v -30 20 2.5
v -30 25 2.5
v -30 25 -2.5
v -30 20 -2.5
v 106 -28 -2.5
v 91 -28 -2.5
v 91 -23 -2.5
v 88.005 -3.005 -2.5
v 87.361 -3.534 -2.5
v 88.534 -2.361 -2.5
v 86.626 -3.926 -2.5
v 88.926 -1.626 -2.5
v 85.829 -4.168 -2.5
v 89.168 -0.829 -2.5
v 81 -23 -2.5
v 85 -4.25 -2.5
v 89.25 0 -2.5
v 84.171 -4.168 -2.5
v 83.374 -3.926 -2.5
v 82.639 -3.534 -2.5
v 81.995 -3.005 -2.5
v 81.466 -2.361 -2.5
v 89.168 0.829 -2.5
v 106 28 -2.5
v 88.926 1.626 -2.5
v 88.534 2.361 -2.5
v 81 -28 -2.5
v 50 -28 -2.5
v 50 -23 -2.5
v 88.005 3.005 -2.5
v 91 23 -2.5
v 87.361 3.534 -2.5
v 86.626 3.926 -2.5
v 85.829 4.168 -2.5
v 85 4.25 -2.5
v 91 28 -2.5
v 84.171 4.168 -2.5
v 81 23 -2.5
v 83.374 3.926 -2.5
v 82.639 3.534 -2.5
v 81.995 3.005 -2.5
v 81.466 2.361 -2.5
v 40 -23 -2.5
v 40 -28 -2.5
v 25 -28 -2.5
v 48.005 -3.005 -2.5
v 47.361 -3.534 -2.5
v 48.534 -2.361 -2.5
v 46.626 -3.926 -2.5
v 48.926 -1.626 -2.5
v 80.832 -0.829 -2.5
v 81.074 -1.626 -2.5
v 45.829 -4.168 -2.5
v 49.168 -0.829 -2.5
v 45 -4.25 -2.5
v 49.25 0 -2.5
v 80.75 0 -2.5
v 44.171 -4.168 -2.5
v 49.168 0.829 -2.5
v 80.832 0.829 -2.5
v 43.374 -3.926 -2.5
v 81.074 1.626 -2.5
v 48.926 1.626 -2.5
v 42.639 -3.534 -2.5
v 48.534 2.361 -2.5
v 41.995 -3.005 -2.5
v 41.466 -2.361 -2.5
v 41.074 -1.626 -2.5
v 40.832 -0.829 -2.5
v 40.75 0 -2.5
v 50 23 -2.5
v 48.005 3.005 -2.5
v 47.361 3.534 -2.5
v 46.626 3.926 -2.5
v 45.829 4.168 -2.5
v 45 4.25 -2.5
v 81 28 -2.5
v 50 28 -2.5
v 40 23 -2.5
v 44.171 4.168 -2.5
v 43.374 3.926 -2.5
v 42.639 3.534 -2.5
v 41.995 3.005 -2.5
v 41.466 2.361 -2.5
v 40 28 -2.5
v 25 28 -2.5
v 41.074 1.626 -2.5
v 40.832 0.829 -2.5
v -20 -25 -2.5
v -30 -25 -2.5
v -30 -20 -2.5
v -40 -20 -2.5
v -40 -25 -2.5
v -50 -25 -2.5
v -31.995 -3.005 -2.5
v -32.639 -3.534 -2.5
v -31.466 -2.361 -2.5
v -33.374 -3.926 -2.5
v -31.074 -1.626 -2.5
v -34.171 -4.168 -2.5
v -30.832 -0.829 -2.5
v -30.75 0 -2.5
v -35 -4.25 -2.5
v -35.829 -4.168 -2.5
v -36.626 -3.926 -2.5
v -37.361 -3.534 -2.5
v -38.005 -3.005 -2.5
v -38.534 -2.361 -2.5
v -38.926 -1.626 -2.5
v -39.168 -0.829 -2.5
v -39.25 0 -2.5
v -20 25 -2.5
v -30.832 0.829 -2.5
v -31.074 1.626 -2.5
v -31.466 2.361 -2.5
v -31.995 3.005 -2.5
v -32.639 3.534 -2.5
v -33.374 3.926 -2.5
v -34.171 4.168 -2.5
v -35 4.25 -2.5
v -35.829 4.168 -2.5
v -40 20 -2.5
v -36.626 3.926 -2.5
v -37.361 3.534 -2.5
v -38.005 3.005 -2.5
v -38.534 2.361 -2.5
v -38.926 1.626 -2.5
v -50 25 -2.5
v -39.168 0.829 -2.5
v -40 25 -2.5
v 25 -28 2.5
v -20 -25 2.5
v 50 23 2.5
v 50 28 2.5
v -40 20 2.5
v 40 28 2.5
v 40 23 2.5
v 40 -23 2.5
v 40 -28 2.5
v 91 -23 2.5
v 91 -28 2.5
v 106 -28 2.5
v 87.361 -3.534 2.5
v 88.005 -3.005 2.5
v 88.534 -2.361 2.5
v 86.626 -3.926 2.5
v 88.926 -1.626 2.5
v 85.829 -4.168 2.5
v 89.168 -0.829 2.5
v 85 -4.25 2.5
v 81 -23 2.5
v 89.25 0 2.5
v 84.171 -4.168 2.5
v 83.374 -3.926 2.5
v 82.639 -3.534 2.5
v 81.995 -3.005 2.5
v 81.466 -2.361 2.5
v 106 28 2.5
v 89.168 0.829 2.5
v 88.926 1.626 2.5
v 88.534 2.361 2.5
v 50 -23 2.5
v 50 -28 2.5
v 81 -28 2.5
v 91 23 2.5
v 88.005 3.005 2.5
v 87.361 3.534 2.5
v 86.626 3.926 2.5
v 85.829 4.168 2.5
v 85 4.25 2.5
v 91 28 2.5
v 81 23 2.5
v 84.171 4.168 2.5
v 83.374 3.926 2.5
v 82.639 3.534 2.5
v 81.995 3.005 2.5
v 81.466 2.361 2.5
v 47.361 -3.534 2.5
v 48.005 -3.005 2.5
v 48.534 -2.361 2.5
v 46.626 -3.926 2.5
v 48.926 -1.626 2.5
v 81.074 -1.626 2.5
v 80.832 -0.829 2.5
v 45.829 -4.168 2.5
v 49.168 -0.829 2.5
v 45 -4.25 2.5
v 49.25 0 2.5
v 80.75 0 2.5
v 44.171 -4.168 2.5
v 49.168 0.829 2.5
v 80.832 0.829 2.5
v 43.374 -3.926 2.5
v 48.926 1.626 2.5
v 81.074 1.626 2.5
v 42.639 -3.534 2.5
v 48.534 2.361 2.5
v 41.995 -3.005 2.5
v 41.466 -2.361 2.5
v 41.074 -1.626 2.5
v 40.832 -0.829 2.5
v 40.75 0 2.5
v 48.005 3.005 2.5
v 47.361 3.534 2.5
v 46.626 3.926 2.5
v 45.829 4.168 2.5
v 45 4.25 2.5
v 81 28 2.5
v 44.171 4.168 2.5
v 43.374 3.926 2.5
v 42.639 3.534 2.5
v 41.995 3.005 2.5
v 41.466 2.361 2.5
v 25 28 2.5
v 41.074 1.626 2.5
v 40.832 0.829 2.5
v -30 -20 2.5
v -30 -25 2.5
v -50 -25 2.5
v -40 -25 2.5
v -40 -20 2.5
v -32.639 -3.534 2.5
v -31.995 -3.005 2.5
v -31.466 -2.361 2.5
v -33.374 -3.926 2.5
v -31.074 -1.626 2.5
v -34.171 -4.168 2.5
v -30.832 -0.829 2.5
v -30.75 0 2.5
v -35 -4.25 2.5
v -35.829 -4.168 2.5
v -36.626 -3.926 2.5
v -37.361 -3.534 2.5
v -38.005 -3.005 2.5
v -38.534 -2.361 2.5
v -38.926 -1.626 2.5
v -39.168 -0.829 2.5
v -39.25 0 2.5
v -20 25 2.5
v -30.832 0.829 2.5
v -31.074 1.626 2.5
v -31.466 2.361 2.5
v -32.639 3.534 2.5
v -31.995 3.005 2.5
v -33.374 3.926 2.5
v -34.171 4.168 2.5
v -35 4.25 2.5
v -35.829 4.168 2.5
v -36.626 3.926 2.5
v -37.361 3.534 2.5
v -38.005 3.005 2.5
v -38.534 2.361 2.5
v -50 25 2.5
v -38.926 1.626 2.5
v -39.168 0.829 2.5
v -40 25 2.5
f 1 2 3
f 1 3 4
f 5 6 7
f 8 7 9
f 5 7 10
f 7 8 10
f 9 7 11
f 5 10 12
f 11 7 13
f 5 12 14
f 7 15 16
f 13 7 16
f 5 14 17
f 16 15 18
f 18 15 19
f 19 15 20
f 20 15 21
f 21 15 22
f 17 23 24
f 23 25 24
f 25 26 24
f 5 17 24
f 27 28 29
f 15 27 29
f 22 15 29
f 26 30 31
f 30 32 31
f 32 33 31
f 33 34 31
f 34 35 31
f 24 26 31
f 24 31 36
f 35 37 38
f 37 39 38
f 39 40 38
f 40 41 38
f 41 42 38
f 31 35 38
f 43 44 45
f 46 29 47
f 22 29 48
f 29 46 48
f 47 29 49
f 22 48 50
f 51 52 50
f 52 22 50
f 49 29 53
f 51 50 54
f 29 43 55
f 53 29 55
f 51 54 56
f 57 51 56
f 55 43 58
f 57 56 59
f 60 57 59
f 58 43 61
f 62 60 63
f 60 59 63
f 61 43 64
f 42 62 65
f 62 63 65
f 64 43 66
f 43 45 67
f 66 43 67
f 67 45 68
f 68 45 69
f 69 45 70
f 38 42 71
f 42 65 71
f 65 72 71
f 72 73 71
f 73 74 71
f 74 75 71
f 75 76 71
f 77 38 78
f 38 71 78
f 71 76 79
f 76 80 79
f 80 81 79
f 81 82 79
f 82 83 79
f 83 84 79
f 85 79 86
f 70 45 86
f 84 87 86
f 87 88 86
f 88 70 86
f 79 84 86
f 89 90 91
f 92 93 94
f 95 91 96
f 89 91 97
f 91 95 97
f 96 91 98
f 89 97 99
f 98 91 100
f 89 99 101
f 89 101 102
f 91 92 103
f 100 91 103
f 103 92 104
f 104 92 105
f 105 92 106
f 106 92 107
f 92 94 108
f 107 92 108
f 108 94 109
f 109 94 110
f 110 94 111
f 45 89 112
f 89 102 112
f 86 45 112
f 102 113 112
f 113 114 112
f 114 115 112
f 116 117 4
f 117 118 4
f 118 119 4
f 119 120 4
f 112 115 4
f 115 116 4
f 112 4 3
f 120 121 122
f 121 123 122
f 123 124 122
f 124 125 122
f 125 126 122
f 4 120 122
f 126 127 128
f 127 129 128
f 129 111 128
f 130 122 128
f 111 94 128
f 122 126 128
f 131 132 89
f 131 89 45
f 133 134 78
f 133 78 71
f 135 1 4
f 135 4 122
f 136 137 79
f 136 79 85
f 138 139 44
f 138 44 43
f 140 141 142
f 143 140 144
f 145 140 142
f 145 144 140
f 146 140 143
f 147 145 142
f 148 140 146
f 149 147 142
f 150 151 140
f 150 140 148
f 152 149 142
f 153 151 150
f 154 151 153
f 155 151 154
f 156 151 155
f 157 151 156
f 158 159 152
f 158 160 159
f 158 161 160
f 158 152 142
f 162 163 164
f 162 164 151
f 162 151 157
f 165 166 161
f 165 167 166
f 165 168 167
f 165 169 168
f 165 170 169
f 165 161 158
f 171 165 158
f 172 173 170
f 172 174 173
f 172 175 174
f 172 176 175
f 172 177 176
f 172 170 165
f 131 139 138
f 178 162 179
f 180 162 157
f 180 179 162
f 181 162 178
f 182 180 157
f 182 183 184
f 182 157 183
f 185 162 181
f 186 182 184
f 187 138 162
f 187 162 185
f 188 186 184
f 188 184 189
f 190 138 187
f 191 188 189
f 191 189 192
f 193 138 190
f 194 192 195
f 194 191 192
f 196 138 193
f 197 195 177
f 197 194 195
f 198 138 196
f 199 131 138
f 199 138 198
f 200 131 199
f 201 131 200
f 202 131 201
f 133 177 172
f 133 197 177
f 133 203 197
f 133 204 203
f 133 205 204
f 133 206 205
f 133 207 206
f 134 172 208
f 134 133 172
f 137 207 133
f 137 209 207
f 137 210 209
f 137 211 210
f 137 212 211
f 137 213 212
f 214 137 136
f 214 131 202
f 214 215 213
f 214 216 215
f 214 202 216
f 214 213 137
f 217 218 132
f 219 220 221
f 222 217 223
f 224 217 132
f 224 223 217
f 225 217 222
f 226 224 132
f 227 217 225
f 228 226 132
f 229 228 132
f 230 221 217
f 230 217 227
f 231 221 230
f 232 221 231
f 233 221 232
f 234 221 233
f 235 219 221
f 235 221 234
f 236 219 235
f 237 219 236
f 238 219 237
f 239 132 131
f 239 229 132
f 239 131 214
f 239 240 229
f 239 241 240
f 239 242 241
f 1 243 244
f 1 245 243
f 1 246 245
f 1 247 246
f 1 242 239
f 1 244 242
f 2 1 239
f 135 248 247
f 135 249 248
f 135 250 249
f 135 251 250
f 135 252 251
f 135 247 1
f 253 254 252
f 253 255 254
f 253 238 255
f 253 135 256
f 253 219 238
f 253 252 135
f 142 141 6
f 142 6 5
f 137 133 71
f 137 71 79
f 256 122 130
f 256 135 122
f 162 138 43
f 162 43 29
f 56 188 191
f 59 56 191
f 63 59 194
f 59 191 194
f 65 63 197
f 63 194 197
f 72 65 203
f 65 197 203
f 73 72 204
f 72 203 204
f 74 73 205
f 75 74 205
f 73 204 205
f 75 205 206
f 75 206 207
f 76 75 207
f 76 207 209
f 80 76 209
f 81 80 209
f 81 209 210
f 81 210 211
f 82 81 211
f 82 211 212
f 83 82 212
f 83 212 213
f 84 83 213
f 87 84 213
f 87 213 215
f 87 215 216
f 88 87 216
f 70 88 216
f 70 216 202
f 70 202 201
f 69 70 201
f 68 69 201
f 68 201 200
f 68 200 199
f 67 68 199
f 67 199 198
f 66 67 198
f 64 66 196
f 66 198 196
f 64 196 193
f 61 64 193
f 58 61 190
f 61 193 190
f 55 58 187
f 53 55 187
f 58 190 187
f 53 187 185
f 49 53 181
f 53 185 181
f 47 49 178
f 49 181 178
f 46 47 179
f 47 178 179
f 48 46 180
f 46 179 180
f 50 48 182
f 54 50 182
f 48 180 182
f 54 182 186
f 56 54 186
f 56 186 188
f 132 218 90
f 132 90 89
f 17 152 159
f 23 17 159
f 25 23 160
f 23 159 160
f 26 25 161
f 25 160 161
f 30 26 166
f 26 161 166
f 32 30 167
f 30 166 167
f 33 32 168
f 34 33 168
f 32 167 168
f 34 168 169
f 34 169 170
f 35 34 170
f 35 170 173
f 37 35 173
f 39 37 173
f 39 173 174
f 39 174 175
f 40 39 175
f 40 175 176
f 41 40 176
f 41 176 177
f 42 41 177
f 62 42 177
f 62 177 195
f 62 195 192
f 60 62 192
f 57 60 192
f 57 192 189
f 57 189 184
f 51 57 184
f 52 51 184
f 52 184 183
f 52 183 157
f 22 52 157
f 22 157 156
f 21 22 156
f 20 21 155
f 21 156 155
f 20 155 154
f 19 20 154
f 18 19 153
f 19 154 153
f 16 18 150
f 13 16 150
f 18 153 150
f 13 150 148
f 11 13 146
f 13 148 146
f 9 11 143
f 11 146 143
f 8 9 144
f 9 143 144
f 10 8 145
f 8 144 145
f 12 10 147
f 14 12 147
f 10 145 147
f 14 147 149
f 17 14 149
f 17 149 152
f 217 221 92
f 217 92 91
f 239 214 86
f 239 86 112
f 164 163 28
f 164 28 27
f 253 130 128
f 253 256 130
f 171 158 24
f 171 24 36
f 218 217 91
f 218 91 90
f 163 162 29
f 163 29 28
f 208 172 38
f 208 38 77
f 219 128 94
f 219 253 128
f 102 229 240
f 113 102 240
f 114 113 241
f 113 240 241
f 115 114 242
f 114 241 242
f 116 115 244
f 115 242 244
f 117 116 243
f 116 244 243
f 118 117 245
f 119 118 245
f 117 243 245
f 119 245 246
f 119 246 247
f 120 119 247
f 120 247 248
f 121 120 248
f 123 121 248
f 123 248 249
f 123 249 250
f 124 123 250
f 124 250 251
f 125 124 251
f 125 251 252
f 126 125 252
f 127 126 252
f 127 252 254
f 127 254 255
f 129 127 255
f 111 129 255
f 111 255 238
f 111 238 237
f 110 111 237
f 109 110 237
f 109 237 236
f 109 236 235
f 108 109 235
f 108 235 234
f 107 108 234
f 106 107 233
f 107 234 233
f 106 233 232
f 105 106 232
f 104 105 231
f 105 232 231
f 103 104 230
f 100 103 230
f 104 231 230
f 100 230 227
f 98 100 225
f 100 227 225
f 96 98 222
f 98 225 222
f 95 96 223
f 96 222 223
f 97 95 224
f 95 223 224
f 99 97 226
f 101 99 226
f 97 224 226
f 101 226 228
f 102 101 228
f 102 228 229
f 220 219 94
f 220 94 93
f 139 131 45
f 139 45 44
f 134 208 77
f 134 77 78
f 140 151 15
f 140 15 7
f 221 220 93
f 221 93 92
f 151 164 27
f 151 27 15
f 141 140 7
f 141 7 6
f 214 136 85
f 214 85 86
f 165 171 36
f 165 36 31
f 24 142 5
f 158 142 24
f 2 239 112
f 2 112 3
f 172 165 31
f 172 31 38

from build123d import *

# Parameters (mm, degrees)
BOSS_EXTRUDE1_DEPTH = 2.5
CUT_EXTRUDE1_REACH  = 111.75
SKETCH2_R           = 4.25


with BuildPart() as part:
    # Sketch1 → Boss-Extrude1 (new, symmetric)
    with BuildSketch(Plane(origin=(0, 0, 0), x_dir=(0, 1, 0), z_dir=(0, 0, 1))):
        Polygon((25, 50), (-25, 50), (-25, 40), (-20, 40), (-20, 30), (-25, 30), (-25, 20), (-28, -25), (-28, -40), (-23, -40), (-23, -50), (-28, -50), (-28, -81), (-23, -81), (-23, -91), (-28, -91), (-28, -106), (28, -106), (28, -91), (23, -91), (23, -81), (28, -81), (28, -50), (23, -50), (23, -40), (28, -40), (28, -25), (25, 20), (25, 30), (20, 30), (20, 40), (25, 40), align=None)
    extrude(amount=BOSS_EXTRUDE1_DEPTH, both=True)

    # Sketch2 → Cut-Extrude1 (cut, up to next)
    with BuildSketch(Plane.XY.offset(2.5), mode=Mode.PRIVATE) as cut_extrude1_sk1:
        with Locations((-35, 0)):
            Circle(SKETCH2_R)
    cut_extrude1_tool1 = extrude(cut_extrude1_sk1.sketch, amount=-CUT_EXTRUDE1_REACH, mode=Mode.PRIVATE) & part.part
    # Sketch2 → Cut-Extrude1 (cut, up to next)
    with BuildSketch(Plane.XY.offset(2.5), mode=Mode.PRIVATE) as cut_extrude1_sk2:
        with Locations((45, 0)):
            Circle(SKETCH2_R)
    cut_extrude1_tool2 = extrude(cut_extrude1_sk2.sketch, amount=-CUT_EXTRUDE1_REACH, mode=Mode.PRIVATE) & part.part
    # Sketch2 → Cut-Extrude1 (cut, up to next)
    with BuildSketch(Plane.XY.offset(2.5), mode=Mode.PRIVATE) as cut_extrude1_sk3:
        with Locations((85, 0)):
            Circle(SKETCH2_R)
    cut_extrude1_tool3 = extrude(cut_extrude1_sk3.sketch, amount=-CUT_EXTRUDE1_REACH, mode=Mode.PRIVATE) & part.part
    add(cut_extrude1_tool1.solids().sort_by_distance((-35, 0, 2.5))[0], mode=Mode.SUBTRACT)
    add(cut_extrude1_tool2.solids().sort_by_distance((45, 0, 2.5))[0], mode=Mode.SUBTRACT)
    add(cut_extrude1_tool3.solids().sort_by_distance((85, 0, 2.5))[0], mode=Mode.SUBTRACT)


solid = part.part
